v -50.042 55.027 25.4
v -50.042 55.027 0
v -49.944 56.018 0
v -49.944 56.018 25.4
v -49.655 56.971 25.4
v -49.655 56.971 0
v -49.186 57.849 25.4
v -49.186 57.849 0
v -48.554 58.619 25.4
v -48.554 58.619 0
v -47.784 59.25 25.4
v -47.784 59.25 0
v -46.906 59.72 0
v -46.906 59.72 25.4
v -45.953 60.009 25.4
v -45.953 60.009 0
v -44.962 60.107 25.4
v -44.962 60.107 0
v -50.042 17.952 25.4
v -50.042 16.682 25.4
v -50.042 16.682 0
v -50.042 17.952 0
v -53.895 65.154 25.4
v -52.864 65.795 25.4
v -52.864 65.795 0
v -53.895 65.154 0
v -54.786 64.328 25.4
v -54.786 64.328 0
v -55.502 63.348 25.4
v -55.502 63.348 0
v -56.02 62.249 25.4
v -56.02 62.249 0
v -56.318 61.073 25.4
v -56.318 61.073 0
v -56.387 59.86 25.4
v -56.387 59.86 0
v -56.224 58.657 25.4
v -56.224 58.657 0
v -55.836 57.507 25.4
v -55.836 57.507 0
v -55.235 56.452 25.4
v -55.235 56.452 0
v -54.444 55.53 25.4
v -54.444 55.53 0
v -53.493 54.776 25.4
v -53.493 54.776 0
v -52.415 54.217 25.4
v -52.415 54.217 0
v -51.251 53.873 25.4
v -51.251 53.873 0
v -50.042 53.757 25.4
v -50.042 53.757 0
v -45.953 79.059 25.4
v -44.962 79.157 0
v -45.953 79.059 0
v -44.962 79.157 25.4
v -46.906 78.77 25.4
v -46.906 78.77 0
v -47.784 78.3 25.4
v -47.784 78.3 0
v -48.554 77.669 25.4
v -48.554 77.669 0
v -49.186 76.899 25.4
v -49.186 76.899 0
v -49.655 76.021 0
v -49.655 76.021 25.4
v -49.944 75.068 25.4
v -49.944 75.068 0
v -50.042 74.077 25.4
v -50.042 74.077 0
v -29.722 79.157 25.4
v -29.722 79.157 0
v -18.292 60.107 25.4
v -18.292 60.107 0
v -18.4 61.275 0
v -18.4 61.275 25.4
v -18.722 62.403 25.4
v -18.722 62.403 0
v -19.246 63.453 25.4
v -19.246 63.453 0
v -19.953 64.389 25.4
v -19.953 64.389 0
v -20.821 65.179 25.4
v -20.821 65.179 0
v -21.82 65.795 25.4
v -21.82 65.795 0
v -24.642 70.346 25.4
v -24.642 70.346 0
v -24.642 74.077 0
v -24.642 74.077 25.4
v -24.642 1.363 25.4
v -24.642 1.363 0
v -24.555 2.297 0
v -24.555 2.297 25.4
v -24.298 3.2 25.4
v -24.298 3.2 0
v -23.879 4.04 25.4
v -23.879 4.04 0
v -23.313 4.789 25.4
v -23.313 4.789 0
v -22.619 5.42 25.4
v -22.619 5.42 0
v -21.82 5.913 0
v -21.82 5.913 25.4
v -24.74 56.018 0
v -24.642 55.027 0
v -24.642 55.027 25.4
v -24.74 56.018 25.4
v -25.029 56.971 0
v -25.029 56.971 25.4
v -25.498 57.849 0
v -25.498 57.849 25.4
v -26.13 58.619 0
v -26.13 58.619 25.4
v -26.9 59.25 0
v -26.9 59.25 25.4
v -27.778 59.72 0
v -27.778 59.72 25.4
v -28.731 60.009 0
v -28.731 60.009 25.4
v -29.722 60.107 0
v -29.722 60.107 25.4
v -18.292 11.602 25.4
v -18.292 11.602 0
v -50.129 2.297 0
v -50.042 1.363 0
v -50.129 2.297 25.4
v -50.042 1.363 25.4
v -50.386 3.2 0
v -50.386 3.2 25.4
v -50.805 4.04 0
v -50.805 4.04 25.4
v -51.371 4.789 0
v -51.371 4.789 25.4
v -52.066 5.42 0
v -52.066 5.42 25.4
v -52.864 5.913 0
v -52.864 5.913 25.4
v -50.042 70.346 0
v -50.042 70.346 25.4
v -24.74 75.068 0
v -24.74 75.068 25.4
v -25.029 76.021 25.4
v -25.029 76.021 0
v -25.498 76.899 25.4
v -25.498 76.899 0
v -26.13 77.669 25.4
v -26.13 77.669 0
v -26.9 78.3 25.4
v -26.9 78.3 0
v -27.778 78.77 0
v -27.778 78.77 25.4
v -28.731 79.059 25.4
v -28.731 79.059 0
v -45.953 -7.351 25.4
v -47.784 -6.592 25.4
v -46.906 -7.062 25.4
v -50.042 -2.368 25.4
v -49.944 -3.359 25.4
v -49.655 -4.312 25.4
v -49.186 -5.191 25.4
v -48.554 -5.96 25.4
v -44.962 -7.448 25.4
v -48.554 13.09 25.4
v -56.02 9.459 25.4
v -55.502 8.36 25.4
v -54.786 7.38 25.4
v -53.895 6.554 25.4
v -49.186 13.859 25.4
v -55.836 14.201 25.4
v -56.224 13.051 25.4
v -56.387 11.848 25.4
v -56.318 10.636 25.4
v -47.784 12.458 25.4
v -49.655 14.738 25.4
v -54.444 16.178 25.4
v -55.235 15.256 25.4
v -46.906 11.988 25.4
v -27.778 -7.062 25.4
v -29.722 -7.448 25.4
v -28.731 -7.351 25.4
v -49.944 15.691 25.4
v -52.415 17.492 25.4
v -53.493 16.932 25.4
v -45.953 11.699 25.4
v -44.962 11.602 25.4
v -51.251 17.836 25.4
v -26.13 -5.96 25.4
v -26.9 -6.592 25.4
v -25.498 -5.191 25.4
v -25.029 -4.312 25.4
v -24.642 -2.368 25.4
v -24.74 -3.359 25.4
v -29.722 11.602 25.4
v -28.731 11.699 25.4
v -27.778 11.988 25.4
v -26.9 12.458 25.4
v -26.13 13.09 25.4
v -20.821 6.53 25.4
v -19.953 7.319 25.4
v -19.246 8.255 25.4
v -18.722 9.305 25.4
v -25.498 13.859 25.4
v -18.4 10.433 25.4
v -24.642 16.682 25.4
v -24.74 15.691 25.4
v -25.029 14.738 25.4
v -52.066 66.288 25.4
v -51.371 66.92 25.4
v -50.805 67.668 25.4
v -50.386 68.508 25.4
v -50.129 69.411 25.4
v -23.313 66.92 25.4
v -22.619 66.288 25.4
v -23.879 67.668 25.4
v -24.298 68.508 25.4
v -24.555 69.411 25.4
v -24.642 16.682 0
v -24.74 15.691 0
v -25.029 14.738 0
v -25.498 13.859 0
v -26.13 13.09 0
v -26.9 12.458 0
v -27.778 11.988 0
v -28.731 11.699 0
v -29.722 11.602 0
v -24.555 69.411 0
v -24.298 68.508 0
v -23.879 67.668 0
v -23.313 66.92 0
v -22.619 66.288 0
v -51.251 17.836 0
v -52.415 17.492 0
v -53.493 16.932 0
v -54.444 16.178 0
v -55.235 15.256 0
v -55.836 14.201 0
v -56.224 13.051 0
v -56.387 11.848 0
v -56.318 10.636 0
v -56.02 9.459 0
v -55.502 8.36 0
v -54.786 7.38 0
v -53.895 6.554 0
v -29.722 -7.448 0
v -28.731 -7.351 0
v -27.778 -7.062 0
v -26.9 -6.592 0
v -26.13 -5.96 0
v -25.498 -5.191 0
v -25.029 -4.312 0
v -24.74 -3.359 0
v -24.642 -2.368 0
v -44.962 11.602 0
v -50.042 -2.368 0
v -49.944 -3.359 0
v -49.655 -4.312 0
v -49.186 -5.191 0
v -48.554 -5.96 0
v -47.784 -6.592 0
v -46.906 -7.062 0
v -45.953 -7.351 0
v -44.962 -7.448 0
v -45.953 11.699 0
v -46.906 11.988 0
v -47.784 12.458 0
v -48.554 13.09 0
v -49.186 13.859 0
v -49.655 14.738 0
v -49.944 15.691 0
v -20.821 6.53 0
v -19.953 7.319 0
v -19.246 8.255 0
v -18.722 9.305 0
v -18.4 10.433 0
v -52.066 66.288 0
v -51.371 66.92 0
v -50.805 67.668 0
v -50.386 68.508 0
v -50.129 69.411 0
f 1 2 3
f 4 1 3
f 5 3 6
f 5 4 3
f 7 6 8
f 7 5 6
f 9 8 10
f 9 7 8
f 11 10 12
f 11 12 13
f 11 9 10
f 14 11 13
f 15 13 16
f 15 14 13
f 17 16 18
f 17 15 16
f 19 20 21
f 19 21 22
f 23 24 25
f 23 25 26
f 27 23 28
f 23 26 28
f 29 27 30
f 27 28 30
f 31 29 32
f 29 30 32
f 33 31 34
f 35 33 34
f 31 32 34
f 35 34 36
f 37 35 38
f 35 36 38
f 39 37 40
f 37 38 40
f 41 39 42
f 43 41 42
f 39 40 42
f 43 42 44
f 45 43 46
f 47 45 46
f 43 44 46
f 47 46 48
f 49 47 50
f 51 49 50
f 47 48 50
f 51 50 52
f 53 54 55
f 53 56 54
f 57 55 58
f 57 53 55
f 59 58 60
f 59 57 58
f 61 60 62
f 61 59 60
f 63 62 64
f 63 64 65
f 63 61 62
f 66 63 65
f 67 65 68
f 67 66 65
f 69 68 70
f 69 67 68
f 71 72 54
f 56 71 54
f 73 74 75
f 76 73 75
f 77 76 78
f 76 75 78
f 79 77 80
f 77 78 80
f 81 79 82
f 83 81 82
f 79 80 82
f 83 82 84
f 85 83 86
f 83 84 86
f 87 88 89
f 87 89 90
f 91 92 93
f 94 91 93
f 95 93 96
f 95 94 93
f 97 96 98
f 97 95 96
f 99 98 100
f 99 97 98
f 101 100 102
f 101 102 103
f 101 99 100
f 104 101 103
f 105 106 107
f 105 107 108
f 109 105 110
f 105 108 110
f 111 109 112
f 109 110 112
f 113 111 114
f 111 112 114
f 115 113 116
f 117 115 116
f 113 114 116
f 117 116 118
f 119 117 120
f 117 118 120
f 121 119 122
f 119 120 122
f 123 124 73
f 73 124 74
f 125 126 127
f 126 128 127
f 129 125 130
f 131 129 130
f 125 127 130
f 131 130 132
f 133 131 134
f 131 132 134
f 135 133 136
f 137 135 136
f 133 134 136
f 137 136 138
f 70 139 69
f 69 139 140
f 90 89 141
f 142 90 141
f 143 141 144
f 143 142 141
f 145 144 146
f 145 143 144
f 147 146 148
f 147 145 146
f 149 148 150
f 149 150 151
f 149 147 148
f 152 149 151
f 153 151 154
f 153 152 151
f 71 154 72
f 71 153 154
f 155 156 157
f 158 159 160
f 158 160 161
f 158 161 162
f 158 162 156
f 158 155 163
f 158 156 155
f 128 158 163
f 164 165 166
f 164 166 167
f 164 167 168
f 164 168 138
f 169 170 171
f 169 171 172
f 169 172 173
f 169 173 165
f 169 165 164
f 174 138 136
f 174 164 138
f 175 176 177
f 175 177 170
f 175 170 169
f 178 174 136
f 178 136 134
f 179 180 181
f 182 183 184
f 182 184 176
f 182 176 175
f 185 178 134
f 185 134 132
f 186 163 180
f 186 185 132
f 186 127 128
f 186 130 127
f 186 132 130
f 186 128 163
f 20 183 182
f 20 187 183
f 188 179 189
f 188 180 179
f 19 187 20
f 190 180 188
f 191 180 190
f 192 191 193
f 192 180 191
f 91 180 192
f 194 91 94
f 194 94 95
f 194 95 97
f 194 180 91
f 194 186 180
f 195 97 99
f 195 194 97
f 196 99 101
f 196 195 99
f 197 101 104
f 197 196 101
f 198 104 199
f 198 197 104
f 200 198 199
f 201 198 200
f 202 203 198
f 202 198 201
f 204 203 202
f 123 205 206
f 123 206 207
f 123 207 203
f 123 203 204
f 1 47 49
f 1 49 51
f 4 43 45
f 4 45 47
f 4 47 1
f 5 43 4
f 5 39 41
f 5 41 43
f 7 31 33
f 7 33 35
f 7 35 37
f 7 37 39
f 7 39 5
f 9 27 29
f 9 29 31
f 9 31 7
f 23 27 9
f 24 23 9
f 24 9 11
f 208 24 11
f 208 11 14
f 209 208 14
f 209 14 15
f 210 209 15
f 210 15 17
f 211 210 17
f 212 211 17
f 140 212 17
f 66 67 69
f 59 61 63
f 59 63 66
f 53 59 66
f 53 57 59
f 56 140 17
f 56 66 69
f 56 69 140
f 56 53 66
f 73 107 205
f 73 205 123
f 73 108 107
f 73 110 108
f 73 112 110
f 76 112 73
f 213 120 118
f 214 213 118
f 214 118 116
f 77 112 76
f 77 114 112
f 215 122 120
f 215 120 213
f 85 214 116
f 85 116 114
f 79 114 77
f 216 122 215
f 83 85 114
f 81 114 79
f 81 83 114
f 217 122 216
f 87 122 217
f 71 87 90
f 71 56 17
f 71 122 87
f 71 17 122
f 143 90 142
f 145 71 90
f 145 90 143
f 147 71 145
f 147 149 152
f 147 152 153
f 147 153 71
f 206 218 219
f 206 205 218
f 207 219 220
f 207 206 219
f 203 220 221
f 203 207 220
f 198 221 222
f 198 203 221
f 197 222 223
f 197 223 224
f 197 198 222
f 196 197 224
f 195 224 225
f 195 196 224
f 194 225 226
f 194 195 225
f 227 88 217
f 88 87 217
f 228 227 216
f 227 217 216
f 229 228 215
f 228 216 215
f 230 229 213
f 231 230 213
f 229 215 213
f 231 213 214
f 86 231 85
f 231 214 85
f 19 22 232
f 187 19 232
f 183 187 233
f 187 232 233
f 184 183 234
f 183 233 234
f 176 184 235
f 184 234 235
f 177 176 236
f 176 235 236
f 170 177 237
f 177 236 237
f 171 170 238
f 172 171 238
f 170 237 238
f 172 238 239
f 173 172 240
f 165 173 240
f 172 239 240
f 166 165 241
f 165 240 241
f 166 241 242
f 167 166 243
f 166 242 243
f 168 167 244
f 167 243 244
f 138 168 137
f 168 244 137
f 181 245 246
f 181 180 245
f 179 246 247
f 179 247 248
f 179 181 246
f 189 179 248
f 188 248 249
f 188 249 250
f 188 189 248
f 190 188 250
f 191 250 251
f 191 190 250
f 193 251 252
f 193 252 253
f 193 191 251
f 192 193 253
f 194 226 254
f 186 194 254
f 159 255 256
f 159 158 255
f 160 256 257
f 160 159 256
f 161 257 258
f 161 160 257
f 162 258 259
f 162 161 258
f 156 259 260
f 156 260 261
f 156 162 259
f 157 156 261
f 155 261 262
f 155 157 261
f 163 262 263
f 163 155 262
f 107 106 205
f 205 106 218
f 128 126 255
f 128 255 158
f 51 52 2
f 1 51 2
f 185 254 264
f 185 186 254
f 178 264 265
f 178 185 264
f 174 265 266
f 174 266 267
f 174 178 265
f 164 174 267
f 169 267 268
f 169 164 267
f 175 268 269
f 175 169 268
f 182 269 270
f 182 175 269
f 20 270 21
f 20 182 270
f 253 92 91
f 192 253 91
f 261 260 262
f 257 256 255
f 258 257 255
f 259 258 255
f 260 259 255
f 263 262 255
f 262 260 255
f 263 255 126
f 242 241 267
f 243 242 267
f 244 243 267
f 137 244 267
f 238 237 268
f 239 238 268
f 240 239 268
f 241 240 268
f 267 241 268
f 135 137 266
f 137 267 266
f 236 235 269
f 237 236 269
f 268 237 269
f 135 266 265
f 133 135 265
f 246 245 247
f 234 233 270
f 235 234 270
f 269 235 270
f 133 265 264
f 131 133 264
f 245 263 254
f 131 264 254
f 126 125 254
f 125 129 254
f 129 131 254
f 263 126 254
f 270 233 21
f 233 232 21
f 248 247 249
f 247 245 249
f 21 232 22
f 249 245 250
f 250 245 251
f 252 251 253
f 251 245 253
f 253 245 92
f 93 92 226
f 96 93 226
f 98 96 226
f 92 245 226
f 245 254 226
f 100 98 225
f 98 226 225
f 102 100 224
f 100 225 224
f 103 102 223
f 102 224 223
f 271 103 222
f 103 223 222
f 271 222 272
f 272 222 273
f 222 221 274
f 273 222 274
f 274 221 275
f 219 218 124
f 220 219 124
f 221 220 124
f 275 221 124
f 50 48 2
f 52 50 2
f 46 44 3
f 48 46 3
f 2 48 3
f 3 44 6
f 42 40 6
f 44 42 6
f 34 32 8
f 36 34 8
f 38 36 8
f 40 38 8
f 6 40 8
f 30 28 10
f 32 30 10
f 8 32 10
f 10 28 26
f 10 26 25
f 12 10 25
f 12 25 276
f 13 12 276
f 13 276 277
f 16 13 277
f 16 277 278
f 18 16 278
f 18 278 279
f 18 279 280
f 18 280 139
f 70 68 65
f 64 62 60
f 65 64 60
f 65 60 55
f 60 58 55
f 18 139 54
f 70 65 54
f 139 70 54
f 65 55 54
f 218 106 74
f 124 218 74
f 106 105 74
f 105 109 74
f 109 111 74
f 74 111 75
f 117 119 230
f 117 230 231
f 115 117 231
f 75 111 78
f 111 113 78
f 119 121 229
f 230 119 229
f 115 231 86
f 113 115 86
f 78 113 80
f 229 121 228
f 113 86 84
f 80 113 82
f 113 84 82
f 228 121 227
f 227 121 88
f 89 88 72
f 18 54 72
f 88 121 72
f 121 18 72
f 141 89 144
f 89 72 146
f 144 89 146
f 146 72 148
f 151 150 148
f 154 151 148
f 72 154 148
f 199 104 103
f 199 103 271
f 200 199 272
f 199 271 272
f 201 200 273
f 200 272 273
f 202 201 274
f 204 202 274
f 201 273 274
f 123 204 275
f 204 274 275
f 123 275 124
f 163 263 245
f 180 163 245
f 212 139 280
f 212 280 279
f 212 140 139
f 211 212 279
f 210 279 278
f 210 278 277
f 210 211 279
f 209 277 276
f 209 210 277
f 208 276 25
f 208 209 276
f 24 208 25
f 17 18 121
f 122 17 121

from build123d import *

# Parameters (mm, degrees)
F1_DEPTH = 25.4
F2_R     = 5.08
F3_DEPTH = 12.7
F4_DEPTH = 12.7
F5_R     = 5.08


with BuildPart() as f1:
    # F0 (on Top) → F1 (new body)
    with BuildSketch(Plane.XY):
        with BuildLine():
            Line((-24.6420629978, 11.6016305983), (-30.9920629978, 11.6016305983))
            ThreePointArc((-30.9920629978, 11.6016305983), (-29.1321910584, 7.1115025378), (-24.6420629978, 5.2516305983))
            ThreePointArc((-24.6420629978, 5.2516305983), (-20.1519349373, 7.1115025378), (-18.2920629978, 11.6016305983))
            Line((-18.2920629978, 11.6016305983), (-18.2920629978, 60.1065419614))
            ThreePointArc((-18.2920629978, 60.1065419614), (-20.1519349373, 64.596670022), (-24.6420629978, 66.4565419614))
            Line((-24.6420629978, 66.4565419614), (-50.0420629978, 66.4565419614))
            ThreePointArc((-50.0420629978, 66.4565419614), (-56.3920629978, 60.1065419614), (-50.0420629978, 53.7565419614))
            Line((-50.0420629978, 53.7565419614), (-50.0420629978, 60.1065419614))
            Line((-50.0420629978, 60.1065419614), (-24.6420629978, 60.1065419614))
            Line((-24.6420629978, 60.1065419614), (-24.6420629978, 11.6016305983))
        make_face()
        with BuildLine():
            Line((-30.9920629978, 11.6016305983), (-50.0420629978, 11.6016305983))
            Line((-50.0420629978, 11.6016305983), (-50.0420629978, 17.9516305983))
            ThreePointArc((-50.0420629978, 17.9516305983), (-56.3920629978, 11.6016305983), (-50.0420629978, 5.2516305983))
            Line((-50.0420629978, 5.2516305983), (-24.6420629978, 5.2516305983))
            ThreePointArc((-24.6420629978, 5.2516305983), (-29.1321910584, 7.1115025378), (-30.9920629978, 11.6016305983))
        make_face()
    extrude(amount=F1_DEPTH)

    # F2
    f2_edges = [f1.edges().sort_by_distance(p)[0] for p in [
        (-24.642063, 11.601631, 12.7),
        (-24.642063, 60.106542, 12.7),
        (-50.042063, 60.106542, 12.7),
        (-50.042063, 11.601631, 12.7),
    ]]
    fillet(f2_edges, radius=F2_R)

    # F3 (add): a face of the model
    f3_faces = [f1.faces().sort_by_distance(p)[0] for p in [
        (-37.3420629978, 66.4565419614, 12.7),
    ]]
    extrude(f3_faces, amount=F3_DEPTH)

    # F4 (add): a face of the model
    f4_faces = [f1.faces().sort_by_distance(p)[0] for p in [
        (-37.3420629978, 5.2516305983, 12.7),
    ]]
    extrude(f4_faces, amount=F4_DEPTH)

    # F5
    f5_edges = [f1.edges().sort_by_distance(p)[0] for p in [
        (-50.042063, 79.156542, 12.7),
        (-50.042063, -7.448369, 12.7),
        (-50.042063, 5.251631, 12.7),
        (-50.042063, 66.456542, 12.7),
        (-24.642063, 66.456542, 12.7),
        (-24.642063, 79.156542, 12.7),
        (-24.642063, -7.448369, 12.7),
        (-24.642063, 5.251631, 12.7),
    ]]
    fillet(f5_edges, radius=F5_R)


solid = f1.part
